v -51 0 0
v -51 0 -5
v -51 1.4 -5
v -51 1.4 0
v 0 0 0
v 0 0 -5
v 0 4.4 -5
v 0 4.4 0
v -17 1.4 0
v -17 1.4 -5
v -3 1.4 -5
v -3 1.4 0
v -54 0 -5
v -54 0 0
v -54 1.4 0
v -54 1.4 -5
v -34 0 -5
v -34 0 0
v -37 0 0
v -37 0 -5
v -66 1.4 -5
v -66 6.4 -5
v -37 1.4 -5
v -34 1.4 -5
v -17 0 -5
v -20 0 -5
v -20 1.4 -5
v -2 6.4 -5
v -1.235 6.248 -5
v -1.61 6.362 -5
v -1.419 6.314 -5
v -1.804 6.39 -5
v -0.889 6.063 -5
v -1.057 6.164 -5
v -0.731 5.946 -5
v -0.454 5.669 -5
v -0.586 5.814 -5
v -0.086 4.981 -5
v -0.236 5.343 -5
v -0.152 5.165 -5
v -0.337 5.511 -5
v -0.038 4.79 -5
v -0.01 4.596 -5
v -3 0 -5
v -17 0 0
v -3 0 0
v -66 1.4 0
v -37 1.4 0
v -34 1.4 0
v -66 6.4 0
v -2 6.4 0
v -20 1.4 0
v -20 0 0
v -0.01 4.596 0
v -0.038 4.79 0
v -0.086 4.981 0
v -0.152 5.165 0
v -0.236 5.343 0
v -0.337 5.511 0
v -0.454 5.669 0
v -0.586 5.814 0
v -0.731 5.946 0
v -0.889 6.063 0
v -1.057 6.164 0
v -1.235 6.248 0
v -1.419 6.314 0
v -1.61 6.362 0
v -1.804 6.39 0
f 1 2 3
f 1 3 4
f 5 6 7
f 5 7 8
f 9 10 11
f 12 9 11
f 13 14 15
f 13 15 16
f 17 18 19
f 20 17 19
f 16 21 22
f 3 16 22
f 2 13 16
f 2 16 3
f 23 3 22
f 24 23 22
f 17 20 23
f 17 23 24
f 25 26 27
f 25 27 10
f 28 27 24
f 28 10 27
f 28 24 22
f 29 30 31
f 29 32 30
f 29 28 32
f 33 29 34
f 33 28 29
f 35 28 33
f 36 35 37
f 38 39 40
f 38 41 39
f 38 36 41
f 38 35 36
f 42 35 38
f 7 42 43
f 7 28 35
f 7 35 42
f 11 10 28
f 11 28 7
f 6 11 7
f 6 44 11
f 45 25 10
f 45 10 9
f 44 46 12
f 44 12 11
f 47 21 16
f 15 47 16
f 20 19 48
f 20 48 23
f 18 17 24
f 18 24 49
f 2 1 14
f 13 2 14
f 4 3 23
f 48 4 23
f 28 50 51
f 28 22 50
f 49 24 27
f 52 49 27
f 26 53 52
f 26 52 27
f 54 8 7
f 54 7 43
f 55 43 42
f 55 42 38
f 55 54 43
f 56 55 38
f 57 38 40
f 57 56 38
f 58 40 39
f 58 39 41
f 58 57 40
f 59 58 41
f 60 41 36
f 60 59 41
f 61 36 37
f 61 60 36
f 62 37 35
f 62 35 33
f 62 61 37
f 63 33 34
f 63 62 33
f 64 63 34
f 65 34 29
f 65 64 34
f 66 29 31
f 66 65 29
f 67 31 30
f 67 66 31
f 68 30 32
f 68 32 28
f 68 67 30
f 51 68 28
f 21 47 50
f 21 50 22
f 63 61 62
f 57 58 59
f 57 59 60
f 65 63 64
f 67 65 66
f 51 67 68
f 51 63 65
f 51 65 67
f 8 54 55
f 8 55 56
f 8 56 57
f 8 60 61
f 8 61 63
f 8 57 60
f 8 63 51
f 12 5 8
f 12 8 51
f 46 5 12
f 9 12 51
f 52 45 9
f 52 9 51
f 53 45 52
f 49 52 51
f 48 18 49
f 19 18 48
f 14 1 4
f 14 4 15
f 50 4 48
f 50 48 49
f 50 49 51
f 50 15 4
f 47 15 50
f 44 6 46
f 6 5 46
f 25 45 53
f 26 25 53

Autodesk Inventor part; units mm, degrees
ref_plane "YZ Plane" through (0, 0, 0) normal (1, 0, 0) x (0, 1, 0)
ref_plane "XZ Plane" through (0, 0, 0) normal (0, 1, 0) x (-1, 0, 0)
ref_plane "XY Plane" through (0, 0, 0) normal (0, 0, 1) x (1, 0, 0)
sketch "Эскиз1" plane through (0, 0, 0) normal (0, 1, 0) x (-1, 0, 0)
  line L0 (0, 0) -> (3, 0)
  line L1 (3, 0) -> (3, -5)
  line L2 (3, -5) -> (0, -5)
  line L3 (0, -5) -> (0, 0)
  line L4 (17, 0) -> (20, 0)
  line L5 (20, 0) -> (20, -5)
  line L6 (20, -5) -> (17, -5)
  line L7 (17, -5) -> (17, 0)
  line L8 (34, 0) -> (37, 0)
  line L9 (37, 0) -> (37, -5)
  line L10 (37, -5) -> (34, -5)
  line L11 (34, -5) -> (34, 0)
  line L12 (51, 0) -> (54, 0)
  line L13 (54, 0) -> (54, -5)
  line L14 (54, -5) -> (51, -5)
  line L15 (51, -5) -> (51, 0)
  dimension "d0" = 3
  dimension "d1" = 5
  dimension "d3" = 3
  dimension "d4" = 5
  dimension "d6" = 3
  dimension "d7" = 5
  dimension "d9" = 3
  dimension "d10" = 5
extrude "Выдавливание1" add sketch "Эскиз1" along normal blind 1.4
sketch "Эскиз2" plane through (0, 1.4, 0) normal (0, 1, 0) x (1, 0, 0)
  line L0 (0, 0) -> (-66, 0)
  line L1 (-66, 0) -> (-66, 5)
  line L2 (-66, 5) -> (0, 5)
  line L3 (0, 5) -> (0, 0)
  dimension "d13" = 5
  dimension "d14" = 66
extrude "Выдавливание2" add sketch "Эскиз2" along normal blind 5
fillet "Сопряжение1" radius 2 1 edges at (0, 6.4, -2.5)
properties part number "Bus_copper_bottom" material "Медь"
